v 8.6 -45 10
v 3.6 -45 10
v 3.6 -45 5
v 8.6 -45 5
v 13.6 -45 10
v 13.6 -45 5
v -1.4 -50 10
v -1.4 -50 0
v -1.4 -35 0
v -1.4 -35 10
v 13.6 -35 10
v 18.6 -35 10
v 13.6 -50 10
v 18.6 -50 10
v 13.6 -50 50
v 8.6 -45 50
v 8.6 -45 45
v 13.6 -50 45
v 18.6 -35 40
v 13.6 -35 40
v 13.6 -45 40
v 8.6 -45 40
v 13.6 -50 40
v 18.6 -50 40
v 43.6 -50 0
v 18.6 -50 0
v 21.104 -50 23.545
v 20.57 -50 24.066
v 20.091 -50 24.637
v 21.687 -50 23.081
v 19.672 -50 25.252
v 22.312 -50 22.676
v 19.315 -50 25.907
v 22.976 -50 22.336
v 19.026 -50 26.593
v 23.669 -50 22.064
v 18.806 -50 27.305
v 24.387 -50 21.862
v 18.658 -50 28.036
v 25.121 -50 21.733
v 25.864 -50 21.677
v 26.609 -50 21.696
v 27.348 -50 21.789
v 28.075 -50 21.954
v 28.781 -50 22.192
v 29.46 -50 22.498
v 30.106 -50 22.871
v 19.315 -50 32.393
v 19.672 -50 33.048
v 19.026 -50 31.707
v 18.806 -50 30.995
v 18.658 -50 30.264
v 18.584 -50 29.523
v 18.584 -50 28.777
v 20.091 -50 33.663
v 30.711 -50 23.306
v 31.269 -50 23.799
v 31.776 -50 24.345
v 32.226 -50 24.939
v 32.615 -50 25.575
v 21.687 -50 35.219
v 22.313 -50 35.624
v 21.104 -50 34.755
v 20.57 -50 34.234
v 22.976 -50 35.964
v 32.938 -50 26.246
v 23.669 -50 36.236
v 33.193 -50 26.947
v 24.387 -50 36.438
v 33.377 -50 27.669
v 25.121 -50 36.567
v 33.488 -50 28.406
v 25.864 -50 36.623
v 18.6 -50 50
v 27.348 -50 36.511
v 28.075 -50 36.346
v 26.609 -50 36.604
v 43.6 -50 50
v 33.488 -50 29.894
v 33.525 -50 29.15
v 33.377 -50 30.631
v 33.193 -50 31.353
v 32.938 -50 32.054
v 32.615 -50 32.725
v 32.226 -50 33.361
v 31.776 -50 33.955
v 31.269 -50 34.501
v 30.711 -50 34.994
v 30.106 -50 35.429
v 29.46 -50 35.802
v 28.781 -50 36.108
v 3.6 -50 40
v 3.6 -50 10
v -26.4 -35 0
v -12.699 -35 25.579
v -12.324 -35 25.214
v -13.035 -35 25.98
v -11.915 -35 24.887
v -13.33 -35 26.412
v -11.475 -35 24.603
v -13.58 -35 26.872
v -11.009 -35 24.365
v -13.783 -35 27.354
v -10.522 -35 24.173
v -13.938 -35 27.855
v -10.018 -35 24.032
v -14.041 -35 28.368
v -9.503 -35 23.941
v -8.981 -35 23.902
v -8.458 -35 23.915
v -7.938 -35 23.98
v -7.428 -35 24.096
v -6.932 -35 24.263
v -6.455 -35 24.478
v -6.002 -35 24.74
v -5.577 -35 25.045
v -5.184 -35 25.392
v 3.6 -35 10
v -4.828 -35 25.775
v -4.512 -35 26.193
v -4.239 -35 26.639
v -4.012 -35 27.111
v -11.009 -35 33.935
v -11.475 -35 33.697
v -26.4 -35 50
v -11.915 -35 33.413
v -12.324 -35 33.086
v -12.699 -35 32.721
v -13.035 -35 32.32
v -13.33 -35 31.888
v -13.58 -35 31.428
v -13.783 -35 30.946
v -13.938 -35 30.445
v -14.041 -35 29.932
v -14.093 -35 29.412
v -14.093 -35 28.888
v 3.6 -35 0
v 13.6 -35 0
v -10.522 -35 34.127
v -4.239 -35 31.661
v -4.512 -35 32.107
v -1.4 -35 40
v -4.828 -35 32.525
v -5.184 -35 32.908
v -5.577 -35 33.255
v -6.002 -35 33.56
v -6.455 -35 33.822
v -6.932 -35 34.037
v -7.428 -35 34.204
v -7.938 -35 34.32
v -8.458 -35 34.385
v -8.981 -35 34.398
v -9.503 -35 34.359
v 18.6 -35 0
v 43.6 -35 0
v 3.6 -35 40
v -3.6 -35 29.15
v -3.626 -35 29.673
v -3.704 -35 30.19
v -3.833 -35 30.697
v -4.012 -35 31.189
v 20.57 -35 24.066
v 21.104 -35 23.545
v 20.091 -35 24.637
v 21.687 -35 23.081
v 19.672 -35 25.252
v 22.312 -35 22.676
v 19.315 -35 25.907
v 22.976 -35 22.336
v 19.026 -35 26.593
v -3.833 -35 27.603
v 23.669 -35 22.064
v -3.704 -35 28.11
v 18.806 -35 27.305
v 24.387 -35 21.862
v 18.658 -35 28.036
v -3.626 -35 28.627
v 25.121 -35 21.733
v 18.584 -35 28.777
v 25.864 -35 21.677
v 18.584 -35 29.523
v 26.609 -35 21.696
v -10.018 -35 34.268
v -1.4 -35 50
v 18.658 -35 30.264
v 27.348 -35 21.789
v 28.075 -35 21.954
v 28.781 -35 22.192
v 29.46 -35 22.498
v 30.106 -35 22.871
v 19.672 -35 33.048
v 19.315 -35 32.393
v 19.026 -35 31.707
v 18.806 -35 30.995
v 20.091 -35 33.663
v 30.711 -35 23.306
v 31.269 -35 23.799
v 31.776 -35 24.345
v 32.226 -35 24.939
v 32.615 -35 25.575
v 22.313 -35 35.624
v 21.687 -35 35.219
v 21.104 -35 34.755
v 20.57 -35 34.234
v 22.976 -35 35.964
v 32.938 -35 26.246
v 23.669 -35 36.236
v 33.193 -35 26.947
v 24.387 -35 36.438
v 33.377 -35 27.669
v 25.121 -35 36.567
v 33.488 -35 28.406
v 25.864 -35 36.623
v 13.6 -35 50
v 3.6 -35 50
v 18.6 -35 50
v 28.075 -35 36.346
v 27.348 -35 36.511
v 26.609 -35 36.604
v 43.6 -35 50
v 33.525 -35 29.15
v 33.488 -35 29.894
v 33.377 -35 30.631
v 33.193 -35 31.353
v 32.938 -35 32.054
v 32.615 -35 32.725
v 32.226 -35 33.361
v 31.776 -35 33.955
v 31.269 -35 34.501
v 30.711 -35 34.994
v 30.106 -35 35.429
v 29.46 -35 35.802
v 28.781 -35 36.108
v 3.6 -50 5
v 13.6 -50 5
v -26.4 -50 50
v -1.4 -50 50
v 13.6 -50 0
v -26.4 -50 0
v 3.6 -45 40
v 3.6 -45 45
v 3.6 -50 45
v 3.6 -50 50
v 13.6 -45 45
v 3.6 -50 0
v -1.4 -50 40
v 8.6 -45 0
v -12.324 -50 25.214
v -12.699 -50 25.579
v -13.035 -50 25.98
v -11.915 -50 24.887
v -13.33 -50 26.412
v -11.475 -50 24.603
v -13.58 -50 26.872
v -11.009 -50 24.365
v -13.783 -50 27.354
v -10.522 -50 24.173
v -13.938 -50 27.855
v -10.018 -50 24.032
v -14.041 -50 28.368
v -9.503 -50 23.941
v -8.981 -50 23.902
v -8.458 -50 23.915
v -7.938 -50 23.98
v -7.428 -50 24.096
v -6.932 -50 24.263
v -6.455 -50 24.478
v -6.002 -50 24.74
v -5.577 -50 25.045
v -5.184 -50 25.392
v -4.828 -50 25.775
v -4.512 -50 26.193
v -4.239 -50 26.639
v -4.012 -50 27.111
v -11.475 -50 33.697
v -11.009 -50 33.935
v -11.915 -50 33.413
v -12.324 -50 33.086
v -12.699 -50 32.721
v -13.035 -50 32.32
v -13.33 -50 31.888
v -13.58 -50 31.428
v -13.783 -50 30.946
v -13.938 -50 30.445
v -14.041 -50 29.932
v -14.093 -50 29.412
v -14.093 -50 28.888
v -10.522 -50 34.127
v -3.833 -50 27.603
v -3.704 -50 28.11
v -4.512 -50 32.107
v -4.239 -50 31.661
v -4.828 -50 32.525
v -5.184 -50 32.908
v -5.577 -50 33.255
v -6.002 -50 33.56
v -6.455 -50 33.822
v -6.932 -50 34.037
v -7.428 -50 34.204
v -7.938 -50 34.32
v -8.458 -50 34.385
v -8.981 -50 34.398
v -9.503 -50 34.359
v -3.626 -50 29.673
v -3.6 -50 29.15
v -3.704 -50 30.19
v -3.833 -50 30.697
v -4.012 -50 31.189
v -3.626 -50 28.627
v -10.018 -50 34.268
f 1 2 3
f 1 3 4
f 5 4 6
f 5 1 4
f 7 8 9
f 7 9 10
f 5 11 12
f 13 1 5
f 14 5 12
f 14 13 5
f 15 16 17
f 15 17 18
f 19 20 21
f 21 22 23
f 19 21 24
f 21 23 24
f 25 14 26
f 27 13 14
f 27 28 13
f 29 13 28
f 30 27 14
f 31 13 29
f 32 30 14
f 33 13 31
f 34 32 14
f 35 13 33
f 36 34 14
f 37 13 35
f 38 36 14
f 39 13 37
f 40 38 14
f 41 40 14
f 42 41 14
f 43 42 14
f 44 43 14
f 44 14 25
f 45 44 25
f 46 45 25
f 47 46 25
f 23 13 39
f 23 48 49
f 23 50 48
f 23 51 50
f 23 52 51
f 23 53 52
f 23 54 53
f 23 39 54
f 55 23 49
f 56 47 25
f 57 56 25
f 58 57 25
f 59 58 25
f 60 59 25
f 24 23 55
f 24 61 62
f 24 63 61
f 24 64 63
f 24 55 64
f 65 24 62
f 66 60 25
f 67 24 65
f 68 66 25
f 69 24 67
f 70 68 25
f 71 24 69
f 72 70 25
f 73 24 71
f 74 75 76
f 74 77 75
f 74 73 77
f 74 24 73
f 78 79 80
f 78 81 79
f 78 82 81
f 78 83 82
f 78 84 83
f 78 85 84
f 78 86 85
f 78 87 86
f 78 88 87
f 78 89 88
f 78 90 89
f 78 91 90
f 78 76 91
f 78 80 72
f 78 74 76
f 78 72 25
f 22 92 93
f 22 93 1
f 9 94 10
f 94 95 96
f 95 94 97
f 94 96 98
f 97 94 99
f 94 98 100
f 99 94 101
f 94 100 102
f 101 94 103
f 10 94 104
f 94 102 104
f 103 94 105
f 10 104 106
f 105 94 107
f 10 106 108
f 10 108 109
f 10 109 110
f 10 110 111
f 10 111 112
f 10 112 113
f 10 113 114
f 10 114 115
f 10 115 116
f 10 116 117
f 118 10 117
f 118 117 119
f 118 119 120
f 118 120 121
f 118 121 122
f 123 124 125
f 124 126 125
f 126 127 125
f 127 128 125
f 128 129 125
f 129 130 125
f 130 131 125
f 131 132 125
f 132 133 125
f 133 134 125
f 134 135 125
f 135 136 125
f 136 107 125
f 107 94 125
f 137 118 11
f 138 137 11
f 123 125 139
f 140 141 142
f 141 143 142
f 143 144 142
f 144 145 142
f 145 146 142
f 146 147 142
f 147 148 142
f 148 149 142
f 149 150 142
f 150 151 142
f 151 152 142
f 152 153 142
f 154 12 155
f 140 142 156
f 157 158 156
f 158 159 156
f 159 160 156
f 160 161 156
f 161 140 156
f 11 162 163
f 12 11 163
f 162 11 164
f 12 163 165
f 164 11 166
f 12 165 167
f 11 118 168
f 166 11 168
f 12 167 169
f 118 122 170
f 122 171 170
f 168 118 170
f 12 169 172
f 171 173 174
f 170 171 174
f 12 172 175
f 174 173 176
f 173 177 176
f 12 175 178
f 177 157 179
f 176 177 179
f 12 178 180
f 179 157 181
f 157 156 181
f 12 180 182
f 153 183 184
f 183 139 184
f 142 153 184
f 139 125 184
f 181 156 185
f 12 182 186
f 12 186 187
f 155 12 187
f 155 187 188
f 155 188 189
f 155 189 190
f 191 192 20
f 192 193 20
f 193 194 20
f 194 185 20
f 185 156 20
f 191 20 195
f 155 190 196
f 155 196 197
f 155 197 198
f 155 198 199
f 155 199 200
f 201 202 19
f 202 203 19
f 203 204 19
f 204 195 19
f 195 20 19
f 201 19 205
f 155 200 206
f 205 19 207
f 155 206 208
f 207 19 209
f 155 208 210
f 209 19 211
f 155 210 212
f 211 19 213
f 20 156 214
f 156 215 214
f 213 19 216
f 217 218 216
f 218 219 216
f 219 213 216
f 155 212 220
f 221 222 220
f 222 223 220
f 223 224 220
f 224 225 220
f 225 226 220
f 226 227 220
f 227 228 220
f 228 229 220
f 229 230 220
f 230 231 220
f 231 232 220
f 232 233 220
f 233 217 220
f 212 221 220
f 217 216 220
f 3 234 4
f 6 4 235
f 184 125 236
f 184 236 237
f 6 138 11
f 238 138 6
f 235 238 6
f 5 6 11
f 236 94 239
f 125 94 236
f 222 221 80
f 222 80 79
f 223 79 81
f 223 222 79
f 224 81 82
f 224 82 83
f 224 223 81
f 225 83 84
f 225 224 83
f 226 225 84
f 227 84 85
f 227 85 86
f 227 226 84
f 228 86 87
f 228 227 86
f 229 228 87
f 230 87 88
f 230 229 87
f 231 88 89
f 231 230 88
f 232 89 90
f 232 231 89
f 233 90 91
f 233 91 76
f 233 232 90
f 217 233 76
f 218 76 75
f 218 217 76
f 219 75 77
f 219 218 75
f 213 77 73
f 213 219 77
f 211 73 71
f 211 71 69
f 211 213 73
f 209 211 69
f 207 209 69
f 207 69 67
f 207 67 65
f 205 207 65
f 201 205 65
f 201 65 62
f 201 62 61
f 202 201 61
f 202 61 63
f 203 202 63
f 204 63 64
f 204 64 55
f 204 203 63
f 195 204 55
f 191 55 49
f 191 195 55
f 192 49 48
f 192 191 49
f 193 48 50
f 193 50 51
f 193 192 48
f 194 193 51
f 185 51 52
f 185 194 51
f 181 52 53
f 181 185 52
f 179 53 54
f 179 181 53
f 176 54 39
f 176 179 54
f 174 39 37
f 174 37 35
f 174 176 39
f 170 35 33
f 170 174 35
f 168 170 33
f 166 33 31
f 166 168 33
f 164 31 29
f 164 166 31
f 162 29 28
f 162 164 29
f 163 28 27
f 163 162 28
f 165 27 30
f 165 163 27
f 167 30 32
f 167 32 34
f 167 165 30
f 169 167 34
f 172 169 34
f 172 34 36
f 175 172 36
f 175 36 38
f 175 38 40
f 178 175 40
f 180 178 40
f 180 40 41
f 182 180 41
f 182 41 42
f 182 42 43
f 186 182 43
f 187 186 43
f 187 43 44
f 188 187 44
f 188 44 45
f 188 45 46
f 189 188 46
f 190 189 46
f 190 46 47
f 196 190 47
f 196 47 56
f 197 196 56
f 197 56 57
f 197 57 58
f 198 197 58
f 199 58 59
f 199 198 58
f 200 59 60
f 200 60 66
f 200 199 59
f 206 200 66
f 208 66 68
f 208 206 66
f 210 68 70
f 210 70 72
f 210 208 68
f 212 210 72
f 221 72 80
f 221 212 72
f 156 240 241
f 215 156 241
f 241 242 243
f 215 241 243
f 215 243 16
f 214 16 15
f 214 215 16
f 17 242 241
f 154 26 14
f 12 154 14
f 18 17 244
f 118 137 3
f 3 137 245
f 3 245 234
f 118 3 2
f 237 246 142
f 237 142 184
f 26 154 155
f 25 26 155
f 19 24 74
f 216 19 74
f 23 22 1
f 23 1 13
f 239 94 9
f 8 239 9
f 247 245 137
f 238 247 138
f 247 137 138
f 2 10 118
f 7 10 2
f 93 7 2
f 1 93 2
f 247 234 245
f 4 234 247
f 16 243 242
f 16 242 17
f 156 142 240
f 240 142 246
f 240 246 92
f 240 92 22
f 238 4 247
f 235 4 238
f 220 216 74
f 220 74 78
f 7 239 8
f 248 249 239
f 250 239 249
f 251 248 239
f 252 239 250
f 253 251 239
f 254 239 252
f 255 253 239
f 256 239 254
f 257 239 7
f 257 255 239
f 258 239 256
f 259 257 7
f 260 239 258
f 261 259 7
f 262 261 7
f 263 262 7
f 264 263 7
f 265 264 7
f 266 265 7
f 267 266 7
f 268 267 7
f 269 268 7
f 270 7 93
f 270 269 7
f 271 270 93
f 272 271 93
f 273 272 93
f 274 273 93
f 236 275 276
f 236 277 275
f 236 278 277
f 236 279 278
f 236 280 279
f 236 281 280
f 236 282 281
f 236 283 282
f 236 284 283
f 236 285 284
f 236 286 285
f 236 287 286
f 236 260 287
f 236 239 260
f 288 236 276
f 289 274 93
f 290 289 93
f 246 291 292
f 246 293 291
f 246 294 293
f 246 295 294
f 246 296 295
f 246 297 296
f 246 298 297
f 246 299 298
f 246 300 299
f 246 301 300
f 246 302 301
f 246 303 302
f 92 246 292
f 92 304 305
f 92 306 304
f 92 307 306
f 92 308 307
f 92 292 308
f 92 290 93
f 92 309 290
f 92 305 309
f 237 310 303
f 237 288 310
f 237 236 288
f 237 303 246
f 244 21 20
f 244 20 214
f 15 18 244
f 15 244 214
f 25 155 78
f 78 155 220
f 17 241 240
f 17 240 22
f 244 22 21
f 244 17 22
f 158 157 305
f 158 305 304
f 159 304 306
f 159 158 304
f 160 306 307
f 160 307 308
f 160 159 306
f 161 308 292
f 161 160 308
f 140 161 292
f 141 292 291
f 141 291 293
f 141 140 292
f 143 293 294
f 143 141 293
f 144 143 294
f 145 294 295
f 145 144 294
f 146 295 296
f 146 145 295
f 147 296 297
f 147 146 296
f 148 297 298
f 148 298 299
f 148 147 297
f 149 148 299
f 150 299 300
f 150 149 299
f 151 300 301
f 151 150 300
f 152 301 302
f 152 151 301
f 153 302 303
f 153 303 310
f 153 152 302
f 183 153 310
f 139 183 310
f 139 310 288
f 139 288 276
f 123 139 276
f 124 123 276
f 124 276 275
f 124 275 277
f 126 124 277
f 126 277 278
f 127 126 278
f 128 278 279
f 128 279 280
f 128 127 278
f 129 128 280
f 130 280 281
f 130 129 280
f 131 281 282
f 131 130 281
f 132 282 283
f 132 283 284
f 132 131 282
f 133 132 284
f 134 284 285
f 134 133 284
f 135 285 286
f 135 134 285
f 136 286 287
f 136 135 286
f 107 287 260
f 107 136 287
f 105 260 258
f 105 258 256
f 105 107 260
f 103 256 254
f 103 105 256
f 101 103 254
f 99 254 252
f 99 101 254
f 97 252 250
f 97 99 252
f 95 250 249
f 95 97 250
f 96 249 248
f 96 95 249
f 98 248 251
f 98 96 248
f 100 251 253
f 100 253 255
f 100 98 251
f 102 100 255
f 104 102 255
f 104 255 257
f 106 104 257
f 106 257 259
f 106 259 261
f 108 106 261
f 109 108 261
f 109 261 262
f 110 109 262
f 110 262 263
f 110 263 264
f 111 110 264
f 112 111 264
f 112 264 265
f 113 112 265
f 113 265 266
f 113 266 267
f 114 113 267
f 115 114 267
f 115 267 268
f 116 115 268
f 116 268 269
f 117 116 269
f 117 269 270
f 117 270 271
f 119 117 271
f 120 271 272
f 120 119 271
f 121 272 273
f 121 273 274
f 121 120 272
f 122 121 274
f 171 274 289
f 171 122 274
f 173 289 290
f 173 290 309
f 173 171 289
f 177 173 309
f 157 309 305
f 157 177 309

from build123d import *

# Parameters (mm, degrees)
SKETCH007_W            = 70
SKETCH007_H            = 50
SKETCH007_R            = 7.475
SKETCH007_R_2          = 5.25
PAD010_DEPTH           = 15
POCKET_DEPTH           = 50.001
SKETCH009_W            = 5
SKETCH009_H            = 10
POCKET001_DEPTH        = 15.001
LINEARPATTERN_COUNT    = 2
LINEARPATTERN_PITCH    = 40
SKETCH010_W            = 10
SKETCH010_H            = 5
POCKET002_DEPTH        = 5
LINEARPATTERN001_COUNT = 2
LINEARPATTERN001_PITCH = 35


with BuildPart() as part:
    # Sketch007 → Pad010 (new body)
    with BuildSketch(Plane.XZ):
        with Locations((8.6, 25)):
            Rectangle(SKETCH007_W, SKETCH007_H)
        with Locations((26.05, 29.15)):
            Circle(SKETCH007_R, mode=Mode.SUBTRACT)
        with Locations((-8.85, 29.15)):
            Circle(SKETCH007_R_2, mode=Mode.SUBTRACT)
    extrude(amount=PAD010_DEPTH)

    # Sketch008 (on Face1 of Pad010) → Pocket (cut, through all)
    with BuildSketch(Plane(origin=(0, 0, 50), x_dir=(-1, 0, 0), z_dir=(0, 0, 1))):
        Polygon((-3.6, 15), (-8.6, 10), (-13.6, 15), align=None)
    extrude(amount=-POCKET_DEPTH, mode=Mode.SUBTRACT)

    # Sketch009 (on Face7 of Pocket) → Pocket001 (cut, through all)
    with BuildSketch(Plane.XZ.offset(15)):
        with Locations((16.1, 5)):
            Rectangle(SKETCH009_W, SKETCH009_H)
        with Locations((1.1, 5)):
            Rectangle(SKETCH009_W, SKETCH009_H)
    pocket001 = extrude(amount=-POCKET001_DEPTH, mode=Mode.SUBTRACT)

    # LinearPattern: Pocket001 ×2
    with Locations(*[(0, 0, i * LINEARPATTERN_PITCH) for i in range(1, LINEARPATTERN_COUNT)]):
        add(pocket001, mode=Mode.SUBTRACT)

    # Sketch010 (on Face4 of LinearPattern) → Pocket002 (cut)
    with BuildSketch(Plane.XZ.offset(15)):
        with Locations((8.6, 42.5)):
            Rectangle(SKETCH010_W, SKETCH010_H)
    pocket002 = extrude(amount=-POCKET002_DEPTH, mode=Mode.SUBTRACT)

    # LinearPattern001: Pocket002 ×2
    with Locations(*[(0, 0, -i * LINEARPATTERN001_PITCH) for i in range(1, LINEARPATTERN001_COUNT)]):
        add(pocket002, mode=Mode.SUBTRACT)


with BuildPart() as part_1:
    # Body001 placement: moved
    add(part.part.moved(Location((0, -35, 0))))


solid = part_1.part
